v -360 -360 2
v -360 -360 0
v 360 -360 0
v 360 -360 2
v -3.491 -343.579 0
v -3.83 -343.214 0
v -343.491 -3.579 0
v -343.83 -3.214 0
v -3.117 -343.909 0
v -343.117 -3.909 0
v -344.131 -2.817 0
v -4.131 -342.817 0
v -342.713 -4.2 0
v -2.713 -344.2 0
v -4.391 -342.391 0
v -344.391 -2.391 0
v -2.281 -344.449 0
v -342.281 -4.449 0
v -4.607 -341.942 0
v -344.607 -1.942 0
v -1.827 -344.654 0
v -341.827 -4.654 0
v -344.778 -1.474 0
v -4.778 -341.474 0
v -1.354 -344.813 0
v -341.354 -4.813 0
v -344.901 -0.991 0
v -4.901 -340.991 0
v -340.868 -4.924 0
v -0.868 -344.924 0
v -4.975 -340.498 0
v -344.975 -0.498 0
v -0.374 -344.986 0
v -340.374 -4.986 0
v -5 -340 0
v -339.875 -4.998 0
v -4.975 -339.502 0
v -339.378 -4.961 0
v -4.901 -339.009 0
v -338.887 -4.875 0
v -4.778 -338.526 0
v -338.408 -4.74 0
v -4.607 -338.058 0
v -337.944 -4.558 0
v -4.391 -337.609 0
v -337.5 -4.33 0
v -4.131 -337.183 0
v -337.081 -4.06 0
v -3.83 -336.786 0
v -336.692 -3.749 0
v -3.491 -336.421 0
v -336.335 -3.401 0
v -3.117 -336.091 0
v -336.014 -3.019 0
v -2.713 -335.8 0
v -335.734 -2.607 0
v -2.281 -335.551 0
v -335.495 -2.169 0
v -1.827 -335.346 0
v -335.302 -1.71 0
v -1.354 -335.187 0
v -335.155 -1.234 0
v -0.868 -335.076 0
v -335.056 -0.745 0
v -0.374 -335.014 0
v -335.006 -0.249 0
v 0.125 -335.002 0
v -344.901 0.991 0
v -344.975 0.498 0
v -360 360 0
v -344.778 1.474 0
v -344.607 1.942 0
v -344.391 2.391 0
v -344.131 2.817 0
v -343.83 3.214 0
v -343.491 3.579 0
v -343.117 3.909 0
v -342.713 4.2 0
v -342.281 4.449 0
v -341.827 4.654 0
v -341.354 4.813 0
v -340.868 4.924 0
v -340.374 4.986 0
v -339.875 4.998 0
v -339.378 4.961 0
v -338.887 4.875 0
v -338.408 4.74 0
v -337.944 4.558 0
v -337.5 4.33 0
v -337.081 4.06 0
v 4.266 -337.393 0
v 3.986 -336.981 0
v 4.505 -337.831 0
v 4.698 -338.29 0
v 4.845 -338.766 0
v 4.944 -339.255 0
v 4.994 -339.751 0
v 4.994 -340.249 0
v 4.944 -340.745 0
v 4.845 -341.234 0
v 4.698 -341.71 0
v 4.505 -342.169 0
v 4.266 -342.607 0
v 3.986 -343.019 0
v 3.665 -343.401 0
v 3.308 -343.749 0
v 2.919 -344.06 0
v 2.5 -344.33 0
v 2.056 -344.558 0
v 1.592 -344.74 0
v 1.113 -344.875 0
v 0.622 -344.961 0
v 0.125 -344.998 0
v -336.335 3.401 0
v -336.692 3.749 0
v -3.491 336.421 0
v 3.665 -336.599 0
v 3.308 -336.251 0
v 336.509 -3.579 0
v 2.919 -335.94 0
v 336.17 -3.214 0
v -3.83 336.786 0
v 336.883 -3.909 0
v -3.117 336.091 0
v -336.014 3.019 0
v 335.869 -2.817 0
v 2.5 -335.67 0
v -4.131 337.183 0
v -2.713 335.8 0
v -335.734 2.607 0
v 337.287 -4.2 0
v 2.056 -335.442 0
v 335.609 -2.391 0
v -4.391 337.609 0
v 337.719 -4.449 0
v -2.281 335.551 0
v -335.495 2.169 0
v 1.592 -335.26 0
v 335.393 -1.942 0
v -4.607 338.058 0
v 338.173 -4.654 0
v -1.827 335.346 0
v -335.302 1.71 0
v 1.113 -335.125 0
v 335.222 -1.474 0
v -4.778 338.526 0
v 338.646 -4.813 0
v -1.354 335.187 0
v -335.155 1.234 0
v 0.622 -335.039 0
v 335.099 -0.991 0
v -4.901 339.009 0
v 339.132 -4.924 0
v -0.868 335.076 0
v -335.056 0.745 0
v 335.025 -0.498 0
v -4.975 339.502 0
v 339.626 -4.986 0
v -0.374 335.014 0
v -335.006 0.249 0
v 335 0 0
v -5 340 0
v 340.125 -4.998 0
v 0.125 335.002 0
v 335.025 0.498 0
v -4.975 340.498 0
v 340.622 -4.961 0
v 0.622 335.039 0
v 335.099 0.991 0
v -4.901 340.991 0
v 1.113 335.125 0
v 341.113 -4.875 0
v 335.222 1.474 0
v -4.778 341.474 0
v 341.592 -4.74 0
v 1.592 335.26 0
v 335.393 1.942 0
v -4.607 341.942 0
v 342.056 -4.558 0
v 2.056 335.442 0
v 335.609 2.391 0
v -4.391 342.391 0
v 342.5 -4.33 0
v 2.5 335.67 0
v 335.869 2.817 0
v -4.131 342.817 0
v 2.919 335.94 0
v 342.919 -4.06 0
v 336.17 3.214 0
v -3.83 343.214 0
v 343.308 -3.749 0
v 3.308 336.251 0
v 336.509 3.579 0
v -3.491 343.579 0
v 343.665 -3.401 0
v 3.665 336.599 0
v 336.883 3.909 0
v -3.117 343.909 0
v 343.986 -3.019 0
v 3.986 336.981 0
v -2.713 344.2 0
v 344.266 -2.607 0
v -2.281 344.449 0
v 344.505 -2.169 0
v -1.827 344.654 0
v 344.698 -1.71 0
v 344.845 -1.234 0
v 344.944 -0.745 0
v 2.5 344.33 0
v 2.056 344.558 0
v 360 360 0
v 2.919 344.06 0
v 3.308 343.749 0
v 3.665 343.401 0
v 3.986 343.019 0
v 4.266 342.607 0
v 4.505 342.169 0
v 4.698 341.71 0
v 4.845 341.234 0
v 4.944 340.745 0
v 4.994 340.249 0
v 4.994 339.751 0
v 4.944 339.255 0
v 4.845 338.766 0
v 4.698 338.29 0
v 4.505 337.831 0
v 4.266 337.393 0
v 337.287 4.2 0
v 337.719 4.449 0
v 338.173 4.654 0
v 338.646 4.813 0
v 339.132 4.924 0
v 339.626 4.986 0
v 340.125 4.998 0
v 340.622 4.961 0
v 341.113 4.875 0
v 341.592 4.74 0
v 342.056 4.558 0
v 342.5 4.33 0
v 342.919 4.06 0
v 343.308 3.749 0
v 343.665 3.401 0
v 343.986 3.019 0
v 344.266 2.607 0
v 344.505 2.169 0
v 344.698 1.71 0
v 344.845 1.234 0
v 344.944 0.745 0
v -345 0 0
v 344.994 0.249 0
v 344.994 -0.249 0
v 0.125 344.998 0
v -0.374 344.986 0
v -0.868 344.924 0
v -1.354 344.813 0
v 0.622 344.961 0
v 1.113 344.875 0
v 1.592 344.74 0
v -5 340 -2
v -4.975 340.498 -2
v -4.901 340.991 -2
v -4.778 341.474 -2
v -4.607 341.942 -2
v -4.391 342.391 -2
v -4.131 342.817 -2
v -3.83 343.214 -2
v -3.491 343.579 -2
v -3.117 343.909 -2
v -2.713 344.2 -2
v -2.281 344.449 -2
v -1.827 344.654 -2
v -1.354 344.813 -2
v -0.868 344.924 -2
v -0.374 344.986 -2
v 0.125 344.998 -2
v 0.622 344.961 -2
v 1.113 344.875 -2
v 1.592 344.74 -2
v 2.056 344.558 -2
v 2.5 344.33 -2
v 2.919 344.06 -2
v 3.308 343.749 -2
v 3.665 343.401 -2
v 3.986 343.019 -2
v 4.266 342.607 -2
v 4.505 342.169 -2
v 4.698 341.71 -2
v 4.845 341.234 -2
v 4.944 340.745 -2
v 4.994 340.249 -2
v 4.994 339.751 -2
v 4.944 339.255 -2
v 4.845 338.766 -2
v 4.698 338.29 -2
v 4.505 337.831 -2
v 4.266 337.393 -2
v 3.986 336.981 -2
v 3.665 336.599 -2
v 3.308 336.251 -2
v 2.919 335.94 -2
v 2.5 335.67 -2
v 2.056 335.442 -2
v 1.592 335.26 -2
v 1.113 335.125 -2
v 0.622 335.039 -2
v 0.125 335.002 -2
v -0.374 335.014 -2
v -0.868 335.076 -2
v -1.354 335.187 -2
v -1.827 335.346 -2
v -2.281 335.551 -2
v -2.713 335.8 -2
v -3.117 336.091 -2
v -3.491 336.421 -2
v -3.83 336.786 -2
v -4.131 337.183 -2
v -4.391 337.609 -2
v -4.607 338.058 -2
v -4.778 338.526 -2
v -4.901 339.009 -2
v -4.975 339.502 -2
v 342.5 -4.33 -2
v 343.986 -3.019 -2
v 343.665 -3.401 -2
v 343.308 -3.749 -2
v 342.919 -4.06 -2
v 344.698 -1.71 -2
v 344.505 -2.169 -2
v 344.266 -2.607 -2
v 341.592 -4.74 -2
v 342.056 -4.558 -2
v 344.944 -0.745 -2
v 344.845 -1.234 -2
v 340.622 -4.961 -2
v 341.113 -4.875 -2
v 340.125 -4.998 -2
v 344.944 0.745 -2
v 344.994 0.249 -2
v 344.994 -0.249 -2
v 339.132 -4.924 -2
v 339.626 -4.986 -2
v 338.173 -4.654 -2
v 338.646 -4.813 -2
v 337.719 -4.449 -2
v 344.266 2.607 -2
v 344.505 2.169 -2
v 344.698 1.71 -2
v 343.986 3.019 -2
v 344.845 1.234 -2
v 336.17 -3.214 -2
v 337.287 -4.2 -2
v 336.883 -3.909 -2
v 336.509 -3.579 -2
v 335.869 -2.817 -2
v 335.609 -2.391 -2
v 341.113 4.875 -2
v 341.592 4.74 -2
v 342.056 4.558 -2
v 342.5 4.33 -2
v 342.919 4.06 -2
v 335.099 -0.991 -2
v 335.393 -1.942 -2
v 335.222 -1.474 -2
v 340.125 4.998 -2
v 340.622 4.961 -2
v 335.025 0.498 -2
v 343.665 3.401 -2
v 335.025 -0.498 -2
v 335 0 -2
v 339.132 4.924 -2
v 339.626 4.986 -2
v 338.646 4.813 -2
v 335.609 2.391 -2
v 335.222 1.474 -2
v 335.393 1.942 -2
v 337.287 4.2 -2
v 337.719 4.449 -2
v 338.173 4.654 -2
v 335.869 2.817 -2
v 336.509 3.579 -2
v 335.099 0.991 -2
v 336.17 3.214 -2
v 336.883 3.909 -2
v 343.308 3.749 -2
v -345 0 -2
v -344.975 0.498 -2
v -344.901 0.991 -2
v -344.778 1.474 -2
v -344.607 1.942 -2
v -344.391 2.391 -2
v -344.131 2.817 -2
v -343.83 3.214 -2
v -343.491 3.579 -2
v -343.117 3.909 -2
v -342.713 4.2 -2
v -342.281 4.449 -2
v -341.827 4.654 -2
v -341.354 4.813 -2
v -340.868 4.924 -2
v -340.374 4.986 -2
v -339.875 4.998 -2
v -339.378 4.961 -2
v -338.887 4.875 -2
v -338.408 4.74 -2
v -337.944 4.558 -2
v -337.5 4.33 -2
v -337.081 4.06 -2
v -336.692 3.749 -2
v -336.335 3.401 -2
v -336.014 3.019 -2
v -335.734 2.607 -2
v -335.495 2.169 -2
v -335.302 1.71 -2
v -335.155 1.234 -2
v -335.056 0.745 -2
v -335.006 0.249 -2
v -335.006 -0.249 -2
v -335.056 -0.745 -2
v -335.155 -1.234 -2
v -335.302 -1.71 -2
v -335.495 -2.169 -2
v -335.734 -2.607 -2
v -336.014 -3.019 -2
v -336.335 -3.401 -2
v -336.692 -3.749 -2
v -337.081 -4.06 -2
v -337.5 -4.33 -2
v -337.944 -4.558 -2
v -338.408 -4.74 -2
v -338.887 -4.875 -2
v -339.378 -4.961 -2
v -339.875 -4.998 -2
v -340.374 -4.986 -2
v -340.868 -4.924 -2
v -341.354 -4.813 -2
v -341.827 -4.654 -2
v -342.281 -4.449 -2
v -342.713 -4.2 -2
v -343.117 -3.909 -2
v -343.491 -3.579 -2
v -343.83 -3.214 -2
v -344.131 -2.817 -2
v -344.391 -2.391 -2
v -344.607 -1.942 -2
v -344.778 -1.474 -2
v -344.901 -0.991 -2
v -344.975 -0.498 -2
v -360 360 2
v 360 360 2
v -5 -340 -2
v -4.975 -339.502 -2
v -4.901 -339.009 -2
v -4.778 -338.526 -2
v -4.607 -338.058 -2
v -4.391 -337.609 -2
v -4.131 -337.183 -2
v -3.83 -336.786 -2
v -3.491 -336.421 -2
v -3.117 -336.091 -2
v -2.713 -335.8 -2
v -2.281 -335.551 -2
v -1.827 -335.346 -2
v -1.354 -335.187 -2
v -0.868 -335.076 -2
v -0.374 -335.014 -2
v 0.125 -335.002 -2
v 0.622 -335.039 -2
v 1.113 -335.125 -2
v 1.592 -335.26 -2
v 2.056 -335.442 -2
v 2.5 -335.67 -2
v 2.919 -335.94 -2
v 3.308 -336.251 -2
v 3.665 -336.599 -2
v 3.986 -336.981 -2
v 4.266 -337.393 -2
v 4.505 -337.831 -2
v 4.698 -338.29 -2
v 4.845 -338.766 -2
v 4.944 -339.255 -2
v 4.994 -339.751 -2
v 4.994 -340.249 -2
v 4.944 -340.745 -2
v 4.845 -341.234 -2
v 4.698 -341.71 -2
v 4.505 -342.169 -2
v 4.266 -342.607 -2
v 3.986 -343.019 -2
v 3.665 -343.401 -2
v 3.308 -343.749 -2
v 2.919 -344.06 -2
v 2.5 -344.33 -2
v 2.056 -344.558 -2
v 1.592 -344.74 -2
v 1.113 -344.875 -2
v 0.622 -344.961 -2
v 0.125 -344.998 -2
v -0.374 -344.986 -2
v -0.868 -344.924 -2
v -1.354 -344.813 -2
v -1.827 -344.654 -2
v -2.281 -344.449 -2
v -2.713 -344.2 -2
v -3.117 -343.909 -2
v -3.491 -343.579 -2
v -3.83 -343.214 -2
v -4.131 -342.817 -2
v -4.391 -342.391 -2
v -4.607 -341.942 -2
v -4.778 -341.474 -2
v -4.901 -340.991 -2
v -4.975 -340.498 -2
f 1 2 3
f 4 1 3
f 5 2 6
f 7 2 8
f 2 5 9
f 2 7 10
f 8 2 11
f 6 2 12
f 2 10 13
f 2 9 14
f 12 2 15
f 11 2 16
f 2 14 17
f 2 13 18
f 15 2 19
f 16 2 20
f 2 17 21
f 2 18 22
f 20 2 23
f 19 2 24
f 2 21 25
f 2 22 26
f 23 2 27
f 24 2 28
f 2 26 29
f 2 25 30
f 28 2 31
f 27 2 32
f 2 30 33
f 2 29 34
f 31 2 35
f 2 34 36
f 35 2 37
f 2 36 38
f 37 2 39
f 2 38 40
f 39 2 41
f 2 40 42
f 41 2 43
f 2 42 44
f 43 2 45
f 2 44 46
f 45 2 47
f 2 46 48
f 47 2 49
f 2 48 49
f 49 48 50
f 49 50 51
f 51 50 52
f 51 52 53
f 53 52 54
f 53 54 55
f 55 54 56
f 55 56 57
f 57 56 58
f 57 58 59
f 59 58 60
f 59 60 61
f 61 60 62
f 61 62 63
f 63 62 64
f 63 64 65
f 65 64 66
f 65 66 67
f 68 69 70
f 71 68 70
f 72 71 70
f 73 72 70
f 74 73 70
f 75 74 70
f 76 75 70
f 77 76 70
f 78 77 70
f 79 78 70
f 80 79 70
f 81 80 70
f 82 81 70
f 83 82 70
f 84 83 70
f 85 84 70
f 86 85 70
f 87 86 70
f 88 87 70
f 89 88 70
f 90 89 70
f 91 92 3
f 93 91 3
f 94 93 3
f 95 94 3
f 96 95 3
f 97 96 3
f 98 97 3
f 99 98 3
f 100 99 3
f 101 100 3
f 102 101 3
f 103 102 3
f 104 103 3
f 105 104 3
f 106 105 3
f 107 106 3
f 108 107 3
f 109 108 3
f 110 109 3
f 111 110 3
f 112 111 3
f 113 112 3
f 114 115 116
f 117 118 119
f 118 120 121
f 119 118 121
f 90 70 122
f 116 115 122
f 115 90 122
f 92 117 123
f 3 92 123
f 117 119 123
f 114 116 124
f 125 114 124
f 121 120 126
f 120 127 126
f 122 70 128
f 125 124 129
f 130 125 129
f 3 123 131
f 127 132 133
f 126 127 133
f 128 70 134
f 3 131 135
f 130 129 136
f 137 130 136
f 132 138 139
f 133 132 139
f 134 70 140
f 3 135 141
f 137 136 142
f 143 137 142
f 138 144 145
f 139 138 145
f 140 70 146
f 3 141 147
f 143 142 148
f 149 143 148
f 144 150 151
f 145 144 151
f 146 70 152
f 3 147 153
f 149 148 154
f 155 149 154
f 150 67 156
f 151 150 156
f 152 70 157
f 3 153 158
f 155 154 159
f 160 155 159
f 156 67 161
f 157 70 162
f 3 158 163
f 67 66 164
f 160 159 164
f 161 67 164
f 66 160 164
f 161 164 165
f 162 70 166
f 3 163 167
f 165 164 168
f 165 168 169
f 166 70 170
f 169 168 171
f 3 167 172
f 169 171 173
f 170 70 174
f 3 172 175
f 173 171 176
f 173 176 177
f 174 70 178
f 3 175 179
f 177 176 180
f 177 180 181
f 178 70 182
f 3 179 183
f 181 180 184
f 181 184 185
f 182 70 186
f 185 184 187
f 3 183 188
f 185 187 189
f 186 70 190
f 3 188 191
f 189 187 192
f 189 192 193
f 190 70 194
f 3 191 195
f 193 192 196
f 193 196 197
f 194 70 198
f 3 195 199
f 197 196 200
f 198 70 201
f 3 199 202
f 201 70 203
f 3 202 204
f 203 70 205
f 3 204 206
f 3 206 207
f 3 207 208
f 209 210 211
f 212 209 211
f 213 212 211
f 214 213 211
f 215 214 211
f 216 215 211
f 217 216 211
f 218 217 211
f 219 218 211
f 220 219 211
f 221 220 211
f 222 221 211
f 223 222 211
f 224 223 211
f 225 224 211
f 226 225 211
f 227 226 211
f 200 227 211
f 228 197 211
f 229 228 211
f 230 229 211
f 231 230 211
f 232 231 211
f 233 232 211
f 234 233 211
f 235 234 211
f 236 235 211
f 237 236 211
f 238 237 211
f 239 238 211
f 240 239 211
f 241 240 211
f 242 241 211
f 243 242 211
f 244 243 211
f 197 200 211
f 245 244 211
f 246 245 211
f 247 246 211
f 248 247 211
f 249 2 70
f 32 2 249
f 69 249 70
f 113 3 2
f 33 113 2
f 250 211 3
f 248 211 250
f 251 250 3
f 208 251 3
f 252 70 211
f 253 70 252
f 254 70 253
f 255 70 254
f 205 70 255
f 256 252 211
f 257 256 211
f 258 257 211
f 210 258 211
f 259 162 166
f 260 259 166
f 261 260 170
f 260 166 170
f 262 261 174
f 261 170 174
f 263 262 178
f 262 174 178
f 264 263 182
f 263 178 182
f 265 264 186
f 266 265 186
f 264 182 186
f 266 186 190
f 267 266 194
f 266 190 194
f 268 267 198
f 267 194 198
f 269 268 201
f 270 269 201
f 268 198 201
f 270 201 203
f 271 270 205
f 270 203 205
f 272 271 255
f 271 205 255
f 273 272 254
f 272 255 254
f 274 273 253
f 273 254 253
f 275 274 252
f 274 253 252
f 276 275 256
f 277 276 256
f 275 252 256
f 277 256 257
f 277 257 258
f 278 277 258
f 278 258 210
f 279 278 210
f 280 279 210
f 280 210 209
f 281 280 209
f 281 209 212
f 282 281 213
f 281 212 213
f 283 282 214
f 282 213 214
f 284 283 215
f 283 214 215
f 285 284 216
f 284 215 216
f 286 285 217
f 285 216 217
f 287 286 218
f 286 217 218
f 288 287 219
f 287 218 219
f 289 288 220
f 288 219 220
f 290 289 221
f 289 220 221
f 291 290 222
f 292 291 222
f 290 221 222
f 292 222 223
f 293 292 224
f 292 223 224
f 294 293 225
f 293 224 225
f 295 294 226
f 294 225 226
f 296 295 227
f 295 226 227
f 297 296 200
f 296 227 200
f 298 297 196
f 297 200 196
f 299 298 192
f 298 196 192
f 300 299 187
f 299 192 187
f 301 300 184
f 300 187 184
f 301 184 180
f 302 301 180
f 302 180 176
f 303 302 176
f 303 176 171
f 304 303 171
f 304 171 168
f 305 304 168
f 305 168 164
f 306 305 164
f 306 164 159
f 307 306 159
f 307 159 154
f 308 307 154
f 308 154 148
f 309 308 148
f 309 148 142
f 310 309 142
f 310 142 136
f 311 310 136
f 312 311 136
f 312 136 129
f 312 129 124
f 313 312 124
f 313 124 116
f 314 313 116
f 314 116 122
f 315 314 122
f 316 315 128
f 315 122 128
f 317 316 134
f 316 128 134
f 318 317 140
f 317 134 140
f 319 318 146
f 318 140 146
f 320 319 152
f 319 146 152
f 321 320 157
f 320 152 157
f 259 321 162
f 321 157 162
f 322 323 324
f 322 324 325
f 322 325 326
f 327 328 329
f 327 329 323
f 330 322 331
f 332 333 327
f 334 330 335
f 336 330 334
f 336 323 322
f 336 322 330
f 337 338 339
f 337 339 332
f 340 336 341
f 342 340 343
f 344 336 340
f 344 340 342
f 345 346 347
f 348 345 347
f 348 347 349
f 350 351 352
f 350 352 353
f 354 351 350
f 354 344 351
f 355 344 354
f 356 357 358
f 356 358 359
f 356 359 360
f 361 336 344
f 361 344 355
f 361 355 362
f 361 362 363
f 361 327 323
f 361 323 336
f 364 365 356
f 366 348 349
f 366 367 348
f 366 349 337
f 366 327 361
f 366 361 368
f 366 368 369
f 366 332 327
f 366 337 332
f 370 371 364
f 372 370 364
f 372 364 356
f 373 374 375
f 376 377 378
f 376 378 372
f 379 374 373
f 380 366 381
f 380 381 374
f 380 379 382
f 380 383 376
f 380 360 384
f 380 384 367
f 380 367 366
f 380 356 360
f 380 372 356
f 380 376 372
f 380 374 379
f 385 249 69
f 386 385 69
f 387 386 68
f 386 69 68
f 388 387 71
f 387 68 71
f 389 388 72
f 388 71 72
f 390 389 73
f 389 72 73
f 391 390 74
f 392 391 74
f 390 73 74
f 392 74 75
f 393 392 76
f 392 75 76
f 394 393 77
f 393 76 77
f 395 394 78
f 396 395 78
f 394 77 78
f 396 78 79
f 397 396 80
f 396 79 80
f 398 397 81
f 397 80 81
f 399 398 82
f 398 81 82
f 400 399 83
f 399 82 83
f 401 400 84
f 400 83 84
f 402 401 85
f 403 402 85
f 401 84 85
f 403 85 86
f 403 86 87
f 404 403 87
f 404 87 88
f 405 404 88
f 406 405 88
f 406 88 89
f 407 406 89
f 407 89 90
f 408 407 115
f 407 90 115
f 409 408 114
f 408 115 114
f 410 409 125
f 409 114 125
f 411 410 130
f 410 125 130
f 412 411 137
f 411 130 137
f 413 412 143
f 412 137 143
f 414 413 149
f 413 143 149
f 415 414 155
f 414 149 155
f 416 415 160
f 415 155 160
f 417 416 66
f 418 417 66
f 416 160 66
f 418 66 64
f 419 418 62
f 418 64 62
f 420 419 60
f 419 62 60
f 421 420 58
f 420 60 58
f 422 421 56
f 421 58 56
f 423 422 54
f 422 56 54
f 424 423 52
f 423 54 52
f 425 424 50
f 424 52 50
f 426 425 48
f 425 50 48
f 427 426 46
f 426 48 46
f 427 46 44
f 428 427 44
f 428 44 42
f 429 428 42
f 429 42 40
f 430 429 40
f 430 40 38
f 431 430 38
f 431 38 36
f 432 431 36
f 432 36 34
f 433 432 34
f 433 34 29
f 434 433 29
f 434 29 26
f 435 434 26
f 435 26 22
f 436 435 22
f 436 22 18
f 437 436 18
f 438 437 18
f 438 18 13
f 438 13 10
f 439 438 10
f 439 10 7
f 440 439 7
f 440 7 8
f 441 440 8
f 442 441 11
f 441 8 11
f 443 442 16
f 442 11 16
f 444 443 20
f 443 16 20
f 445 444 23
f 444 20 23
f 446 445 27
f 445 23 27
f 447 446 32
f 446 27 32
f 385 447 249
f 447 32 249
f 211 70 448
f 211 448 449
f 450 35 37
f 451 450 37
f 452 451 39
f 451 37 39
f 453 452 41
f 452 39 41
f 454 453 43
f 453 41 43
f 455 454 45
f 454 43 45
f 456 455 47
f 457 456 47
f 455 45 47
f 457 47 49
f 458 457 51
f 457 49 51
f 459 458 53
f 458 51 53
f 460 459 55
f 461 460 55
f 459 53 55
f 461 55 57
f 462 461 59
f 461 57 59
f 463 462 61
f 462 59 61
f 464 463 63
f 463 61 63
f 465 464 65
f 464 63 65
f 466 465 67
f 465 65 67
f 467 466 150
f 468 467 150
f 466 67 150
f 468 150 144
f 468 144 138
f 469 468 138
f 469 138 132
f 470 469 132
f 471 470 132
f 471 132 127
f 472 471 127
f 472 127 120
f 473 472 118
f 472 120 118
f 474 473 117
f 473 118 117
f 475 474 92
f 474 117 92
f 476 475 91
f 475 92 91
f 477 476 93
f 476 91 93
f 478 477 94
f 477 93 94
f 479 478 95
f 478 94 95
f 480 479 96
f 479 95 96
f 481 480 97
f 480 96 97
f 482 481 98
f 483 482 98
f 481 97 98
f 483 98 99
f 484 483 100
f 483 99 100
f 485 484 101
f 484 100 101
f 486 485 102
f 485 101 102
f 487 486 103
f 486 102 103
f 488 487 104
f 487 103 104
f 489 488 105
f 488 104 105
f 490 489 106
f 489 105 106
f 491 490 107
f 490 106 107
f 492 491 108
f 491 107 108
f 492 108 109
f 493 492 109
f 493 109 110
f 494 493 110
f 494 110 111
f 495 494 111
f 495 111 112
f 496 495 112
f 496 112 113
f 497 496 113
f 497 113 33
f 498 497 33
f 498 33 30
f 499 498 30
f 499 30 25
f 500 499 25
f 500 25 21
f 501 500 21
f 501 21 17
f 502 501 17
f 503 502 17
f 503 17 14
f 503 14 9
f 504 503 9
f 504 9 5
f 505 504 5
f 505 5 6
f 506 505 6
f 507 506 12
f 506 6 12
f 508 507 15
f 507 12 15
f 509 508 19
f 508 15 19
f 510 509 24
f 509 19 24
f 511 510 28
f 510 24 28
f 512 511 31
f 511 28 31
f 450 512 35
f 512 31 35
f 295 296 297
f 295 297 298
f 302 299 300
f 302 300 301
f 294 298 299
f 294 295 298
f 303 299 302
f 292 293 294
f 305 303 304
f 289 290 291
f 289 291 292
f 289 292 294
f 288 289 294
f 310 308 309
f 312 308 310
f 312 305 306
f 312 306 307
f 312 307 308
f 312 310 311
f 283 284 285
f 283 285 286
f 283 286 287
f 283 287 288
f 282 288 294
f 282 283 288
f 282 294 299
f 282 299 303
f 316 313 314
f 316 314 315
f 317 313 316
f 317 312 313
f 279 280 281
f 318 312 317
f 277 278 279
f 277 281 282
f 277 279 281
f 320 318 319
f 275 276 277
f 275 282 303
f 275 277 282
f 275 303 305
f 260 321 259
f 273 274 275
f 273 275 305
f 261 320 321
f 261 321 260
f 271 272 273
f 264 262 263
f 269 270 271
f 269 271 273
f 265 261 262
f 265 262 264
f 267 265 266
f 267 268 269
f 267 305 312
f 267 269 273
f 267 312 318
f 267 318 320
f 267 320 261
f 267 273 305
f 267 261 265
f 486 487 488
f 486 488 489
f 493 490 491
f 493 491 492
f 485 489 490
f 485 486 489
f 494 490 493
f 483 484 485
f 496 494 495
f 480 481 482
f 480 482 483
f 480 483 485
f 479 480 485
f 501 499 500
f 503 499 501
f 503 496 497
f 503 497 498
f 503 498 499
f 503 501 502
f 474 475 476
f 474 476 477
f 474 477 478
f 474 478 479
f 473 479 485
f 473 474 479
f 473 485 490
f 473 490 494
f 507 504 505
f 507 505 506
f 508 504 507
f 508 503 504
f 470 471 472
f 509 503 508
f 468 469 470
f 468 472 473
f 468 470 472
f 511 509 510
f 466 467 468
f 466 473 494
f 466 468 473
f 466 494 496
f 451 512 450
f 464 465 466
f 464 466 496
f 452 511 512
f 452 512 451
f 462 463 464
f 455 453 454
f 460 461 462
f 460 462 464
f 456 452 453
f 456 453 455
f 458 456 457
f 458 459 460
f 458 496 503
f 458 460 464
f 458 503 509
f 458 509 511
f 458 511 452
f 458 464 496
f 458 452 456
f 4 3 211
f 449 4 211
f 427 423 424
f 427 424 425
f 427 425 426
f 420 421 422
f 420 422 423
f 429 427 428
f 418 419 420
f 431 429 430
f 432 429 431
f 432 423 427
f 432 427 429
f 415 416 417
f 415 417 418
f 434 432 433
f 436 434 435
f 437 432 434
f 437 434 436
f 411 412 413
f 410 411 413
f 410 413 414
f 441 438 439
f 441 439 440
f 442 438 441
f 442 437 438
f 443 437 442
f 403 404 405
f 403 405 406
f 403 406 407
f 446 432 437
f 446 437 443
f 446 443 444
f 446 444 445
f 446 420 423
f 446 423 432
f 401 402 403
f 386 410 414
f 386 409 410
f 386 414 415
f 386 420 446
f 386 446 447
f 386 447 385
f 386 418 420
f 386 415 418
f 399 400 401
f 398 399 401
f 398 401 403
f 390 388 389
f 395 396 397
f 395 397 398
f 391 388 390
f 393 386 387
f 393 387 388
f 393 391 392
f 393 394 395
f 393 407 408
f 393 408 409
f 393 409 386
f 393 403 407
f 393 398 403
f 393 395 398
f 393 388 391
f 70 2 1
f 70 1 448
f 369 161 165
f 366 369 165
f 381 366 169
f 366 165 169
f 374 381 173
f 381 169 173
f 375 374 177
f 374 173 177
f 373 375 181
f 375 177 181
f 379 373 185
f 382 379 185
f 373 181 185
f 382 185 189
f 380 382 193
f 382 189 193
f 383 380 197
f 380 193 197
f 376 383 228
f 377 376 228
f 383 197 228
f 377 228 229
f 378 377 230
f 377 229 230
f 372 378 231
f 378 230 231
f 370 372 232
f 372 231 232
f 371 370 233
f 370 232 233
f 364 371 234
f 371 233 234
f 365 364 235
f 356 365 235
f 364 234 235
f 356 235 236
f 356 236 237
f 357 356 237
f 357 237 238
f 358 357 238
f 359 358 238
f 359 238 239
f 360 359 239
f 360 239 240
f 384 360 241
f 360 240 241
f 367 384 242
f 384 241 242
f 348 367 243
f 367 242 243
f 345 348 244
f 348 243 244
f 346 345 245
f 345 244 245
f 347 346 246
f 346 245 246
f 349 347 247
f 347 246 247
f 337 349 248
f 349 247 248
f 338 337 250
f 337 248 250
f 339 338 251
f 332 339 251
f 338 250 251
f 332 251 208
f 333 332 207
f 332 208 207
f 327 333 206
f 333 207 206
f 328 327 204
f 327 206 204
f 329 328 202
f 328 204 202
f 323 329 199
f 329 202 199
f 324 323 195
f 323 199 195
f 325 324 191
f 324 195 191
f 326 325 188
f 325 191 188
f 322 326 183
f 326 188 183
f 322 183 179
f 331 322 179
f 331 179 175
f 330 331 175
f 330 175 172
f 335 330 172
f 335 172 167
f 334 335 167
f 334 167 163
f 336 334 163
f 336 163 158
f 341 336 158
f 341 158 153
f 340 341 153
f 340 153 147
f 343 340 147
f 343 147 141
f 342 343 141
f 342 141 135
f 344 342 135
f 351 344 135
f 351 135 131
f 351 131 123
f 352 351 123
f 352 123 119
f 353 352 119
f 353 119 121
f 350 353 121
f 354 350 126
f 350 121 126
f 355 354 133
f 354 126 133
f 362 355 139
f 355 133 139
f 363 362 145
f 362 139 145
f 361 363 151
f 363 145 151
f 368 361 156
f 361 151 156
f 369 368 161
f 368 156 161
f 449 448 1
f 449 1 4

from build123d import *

# Parameters (mm, degrees)
SKETCH1_W           = 720
SKETCH1_H           = 720
BOSS_EXTRUDE1_DEPTH = 2
SKETCH2_R           = 5
BOSS_EXTRUDE2_DEPTH = 2


with BuildPart() as part:
    # Sketch1 → Boss-Extrude1 (new body)
    with BuildSketch(Plane.XY):
        Rectangle(SKETCH1_W, SKETCH1_H)
    extrude(amount=BOSS_EXTRUDE1_DEPTH)

    # Sketch2 → Boss-Extrude2 (add)
    with BuildSketch(Plane(origin=(0, 0, 0), x_dir=(-1, 0, 0), z_dir=(0, 0, -1))):
        with Locations((0, 340)):
            Circle(SKETCH2_R)
        with Locations((-340, 0)):
            Circle(SKETCH2_R)
        with Locations((0, -340)):
            Circle(SKETCH2_R)
        with Locations((340, 0)):
            Circle(SKETCH2_R)
    extrude(amount=BOSS_EXTRUDE2_DEPTH)


solid = part.part
